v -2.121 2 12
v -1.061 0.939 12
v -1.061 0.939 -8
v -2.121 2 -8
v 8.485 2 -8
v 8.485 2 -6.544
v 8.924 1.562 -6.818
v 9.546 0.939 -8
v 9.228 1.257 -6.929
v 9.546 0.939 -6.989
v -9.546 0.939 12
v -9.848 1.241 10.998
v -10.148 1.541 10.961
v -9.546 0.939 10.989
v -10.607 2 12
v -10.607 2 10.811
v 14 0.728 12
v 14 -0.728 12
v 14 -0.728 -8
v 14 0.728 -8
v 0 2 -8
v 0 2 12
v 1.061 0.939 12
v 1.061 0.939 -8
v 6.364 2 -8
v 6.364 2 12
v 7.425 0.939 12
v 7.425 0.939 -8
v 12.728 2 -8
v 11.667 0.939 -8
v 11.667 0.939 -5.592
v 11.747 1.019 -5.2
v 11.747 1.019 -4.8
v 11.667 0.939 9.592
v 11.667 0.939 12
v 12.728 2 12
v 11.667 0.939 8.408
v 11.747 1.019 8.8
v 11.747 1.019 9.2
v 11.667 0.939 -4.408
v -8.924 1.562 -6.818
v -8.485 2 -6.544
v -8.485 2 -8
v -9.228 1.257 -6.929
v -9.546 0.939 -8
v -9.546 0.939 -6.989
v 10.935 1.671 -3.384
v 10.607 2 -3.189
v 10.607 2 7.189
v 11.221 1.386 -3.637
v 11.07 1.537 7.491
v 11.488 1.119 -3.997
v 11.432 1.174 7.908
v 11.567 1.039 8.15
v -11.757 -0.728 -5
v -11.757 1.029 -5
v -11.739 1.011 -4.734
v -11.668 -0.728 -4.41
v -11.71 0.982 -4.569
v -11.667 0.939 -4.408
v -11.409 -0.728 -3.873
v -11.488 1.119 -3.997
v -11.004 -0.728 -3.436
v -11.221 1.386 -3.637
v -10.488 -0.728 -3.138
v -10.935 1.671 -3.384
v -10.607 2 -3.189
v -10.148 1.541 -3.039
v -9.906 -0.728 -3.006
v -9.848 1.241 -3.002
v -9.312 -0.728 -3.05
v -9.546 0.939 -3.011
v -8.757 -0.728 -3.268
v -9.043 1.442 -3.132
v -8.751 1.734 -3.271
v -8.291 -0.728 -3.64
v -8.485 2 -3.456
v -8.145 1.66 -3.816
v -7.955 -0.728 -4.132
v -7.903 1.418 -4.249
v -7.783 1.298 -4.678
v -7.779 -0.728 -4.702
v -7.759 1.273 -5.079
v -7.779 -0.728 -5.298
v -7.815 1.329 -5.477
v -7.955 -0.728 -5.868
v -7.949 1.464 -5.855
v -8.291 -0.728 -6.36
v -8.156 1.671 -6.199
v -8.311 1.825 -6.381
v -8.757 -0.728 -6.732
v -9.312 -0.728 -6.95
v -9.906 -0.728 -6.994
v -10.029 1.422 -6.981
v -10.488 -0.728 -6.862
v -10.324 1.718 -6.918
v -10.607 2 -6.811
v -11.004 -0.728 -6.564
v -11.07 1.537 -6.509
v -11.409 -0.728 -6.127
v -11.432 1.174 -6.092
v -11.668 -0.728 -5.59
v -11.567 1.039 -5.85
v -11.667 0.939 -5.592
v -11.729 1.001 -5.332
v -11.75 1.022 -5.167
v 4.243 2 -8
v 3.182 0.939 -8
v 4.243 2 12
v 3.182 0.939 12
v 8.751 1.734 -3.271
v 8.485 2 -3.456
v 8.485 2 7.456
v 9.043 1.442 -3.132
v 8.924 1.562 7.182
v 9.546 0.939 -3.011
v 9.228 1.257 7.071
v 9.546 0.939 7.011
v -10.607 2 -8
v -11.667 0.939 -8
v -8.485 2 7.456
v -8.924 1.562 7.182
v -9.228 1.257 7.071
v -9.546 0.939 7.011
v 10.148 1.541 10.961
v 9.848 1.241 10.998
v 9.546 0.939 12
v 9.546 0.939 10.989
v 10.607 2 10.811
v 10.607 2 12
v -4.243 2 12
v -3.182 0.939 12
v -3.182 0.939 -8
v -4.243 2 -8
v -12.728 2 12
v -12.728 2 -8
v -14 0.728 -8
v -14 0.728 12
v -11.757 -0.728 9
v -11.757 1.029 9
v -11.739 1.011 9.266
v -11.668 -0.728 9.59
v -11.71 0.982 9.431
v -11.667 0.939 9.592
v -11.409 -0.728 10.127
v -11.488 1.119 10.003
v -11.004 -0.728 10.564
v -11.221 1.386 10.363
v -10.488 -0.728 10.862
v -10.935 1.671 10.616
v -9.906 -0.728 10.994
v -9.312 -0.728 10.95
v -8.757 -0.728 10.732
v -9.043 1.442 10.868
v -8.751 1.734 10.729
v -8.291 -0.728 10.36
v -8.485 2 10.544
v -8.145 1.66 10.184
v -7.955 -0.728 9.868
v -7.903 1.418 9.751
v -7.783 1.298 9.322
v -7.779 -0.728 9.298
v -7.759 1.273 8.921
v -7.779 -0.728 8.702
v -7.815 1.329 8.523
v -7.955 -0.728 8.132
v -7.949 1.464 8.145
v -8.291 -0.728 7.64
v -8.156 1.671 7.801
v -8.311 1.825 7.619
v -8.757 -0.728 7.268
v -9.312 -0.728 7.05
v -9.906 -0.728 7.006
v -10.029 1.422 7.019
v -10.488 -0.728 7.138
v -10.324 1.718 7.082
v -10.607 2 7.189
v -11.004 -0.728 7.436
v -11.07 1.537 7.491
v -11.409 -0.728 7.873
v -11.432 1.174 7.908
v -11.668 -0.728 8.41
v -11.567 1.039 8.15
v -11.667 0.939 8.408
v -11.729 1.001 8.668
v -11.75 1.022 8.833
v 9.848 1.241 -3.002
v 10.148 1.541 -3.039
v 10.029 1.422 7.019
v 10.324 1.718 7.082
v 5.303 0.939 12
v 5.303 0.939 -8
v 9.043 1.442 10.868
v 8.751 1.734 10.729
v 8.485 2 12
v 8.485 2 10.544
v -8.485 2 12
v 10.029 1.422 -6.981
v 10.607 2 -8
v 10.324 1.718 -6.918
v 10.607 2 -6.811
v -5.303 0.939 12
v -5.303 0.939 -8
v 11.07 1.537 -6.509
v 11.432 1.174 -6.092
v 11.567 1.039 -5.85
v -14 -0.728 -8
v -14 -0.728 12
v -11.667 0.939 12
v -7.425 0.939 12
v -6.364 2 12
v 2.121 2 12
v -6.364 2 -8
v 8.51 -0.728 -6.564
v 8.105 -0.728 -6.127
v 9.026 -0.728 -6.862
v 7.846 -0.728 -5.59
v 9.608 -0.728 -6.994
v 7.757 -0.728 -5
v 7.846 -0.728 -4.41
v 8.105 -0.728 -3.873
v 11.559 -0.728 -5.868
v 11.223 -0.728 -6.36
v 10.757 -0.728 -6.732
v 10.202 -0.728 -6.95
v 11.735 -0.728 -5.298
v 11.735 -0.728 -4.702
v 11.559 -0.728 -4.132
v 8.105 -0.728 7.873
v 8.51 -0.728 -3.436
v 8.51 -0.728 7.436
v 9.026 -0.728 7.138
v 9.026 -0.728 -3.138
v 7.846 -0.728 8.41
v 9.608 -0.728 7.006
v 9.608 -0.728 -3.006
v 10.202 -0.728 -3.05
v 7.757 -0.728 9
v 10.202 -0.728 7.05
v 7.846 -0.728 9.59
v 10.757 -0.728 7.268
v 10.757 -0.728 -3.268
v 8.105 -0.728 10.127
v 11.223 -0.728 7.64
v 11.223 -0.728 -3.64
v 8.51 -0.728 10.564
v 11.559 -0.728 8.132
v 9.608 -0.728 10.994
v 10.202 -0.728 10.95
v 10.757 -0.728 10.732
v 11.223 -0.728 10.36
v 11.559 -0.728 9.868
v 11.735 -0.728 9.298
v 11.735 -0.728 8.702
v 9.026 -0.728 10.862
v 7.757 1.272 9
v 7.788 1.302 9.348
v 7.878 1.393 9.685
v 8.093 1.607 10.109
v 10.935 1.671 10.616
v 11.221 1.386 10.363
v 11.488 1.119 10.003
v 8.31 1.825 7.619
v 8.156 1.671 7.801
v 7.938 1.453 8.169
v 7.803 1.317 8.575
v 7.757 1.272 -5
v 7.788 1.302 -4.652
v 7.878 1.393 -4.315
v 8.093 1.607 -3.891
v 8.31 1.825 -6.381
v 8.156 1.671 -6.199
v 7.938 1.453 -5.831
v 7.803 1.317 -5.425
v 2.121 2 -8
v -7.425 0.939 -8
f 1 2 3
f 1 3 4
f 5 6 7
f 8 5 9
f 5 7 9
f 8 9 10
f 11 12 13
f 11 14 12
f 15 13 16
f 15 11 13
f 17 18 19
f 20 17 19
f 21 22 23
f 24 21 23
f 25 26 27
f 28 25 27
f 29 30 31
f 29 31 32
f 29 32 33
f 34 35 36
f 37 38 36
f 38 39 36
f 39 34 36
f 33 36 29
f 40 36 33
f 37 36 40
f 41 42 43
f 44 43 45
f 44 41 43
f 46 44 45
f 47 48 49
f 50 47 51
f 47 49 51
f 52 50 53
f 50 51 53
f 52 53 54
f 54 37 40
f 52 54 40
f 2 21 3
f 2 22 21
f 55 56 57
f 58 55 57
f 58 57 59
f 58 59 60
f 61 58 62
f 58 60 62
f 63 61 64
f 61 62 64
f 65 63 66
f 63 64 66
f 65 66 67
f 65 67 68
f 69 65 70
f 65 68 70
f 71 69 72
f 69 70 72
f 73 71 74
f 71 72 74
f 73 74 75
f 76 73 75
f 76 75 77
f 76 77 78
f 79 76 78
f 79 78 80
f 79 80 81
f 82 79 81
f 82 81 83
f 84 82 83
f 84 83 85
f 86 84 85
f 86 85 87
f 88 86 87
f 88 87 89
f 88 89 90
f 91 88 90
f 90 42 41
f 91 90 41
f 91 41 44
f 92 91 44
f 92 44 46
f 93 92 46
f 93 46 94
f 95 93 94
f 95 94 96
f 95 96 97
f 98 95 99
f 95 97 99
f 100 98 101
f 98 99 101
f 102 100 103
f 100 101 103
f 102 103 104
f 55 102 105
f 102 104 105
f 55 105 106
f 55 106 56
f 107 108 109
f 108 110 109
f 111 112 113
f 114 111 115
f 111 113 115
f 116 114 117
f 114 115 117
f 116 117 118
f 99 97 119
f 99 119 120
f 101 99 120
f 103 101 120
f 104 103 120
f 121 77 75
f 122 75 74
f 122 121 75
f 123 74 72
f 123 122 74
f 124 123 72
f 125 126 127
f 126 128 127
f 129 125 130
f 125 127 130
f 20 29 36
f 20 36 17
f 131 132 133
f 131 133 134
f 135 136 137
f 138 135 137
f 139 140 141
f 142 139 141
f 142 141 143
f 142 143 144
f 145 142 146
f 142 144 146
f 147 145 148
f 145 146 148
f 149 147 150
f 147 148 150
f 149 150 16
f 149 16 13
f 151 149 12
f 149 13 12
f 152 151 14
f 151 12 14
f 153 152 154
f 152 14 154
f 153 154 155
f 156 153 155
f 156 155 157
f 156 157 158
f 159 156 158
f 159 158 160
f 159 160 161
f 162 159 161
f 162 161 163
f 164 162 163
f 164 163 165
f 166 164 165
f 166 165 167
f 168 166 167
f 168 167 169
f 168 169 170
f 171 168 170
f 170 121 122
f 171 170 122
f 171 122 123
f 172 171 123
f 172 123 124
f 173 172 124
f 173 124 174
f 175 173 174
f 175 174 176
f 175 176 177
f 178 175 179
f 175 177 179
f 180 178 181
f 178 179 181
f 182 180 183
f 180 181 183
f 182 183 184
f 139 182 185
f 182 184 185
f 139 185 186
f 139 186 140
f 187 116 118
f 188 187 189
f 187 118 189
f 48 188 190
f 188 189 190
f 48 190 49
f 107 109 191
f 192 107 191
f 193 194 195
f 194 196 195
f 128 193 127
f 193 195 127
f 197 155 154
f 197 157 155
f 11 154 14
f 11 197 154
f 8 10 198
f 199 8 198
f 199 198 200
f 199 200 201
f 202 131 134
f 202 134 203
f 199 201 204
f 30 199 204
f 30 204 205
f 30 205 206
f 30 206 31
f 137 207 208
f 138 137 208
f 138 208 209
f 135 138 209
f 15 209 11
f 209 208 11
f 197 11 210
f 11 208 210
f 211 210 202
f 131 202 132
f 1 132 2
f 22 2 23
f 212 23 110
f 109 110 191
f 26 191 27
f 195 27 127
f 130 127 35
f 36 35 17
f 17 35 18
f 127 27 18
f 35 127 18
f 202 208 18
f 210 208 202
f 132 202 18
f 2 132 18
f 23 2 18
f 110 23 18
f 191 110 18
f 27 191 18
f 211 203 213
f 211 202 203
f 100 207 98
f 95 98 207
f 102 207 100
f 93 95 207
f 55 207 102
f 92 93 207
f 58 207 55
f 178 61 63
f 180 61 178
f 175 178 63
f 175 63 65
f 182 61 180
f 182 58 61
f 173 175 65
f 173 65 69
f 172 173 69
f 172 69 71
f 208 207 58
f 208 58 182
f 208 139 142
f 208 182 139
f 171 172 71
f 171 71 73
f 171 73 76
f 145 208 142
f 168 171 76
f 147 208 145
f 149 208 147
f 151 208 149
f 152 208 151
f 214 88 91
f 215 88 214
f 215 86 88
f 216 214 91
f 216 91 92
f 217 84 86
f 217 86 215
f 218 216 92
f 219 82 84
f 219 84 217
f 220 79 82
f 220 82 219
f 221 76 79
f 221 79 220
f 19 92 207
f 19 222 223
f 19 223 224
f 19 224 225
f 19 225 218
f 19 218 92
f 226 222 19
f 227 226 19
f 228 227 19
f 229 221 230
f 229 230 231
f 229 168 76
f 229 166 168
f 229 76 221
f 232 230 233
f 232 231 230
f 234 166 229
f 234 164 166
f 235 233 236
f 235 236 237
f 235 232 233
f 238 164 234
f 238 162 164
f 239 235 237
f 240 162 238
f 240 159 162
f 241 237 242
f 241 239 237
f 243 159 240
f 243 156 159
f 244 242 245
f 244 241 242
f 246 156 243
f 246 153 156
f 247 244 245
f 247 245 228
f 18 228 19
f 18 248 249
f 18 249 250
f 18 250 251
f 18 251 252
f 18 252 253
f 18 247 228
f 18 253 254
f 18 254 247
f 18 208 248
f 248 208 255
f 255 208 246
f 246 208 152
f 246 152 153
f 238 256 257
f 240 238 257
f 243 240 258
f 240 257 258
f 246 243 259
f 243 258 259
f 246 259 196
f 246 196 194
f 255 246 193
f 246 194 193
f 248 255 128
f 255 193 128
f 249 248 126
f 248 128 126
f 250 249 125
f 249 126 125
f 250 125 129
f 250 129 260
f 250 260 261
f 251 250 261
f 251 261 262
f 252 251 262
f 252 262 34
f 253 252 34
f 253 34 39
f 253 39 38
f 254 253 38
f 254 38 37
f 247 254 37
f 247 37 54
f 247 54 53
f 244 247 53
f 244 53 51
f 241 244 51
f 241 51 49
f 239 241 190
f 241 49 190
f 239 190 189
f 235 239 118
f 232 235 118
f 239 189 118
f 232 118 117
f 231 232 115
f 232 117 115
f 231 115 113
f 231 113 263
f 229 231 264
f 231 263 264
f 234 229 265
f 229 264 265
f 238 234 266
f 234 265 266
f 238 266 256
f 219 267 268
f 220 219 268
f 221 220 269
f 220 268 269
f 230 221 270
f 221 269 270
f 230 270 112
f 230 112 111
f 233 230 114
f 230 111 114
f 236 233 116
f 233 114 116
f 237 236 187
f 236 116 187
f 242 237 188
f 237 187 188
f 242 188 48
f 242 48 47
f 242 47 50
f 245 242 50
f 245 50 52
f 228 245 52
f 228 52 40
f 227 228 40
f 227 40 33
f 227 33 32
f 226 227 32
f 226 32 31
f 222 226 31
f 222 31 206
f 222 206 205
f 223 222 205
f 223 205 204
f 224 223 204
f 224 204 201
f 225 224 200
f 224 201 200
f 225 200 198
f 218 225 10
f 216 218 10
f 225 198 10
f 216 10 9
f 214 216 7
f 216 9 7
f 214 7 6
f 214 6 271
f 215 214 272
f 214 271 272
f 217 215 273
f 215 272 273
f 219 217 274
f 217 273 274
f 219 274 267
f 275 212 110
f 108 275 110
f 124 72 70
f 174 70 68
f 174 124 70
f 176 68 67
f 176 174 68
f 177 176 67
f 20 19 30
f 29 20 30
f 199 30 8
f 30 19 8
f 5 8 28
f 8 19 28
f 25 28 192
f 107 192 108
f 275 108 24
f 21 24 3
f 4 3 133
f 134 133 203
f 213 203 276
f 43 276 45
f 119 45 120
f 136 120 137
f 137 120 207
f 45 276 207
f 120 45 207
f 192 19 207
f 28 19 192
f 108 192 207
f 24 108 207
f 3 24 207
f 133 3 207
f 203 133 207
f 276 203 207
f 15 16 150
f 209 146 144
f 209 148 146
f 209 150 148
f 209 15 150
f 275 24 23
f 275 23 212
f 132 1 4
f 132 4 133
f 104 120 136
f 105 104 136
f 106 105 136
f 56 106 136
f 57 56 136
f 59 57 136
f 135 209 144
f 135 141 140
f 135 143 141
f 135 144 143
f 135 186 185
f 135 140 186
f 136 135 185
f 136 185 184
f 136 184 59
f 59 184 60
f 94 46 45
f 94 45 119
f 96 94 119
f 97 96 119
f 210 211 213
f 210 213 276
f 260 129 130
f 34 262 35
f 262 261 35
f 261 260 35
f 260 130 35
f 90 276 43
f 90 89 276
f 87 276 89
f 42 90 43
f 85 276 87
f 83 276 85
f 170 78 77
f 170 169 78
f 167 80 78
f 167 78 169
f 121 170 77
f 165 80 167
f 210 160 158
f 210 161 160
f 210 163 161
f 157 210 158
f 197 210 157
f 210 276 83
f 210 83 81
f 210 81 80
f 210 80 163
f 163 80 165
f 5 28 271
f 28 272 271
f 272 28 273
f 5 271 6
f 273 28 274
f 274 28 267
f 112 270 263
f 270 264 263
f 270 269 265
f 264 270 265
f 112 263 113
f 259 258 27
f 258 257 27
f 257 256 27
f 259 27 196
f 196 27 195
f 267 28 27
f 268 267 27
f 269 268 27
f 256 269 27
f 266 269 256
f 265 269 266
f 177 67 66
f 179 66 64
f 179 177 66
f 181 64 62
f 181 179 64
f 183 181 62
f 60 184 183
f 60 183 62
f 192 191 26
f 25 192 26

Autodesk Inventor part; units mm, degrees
ref_plane "YZ Plane" through (0, 0, 0) normal (1, 0, 0) x (0, 1, 0)
ref_plane "XZ Plane" through (0, 0, 0) normal (0, 1, 0) x (-1, 0, 0)
ref_plane "XY Plane" through (0, 0, 0) normal (0, 0, 1) x (1, 0, 0)
sketch "Sketch1" plane through (0, 0, 0) normal (0, 1, 0) x (-1, 0, 0)
  line L0 (14, 12) -> (-14, 12)
  line L1 (-14, 12) -> (-14, -8)
  line L2 (-14, -8) -> (14, -8)
  line L3 (14, -8) -> (14, 12)
  point P0 (0, 0)
  dimension "d0" = 28
  dimension "d1" = 20
  dimension "d4" = 14
extrude "Extrusion1" add sketch "Sketch1" along normal mid plane 4
sketch "Sketch2" plane through (-14, 2, 12) normal (0, 0, 1) x (1, 0, 0)
  line L0 (0, 0) -> (28, 0) projected
  line L1 (14, 0) -> (12.9393, -1.0607)
  line L2 (14, 0) -> (15.5, 0) construction
  line L3 (12.9393, -1.0607) -> (11.8787, 0)
  line L4 (11.8787, 0) -> (10.818, -1.0607)
  line L5 (10.818, -1.0607) -> (9.7574, 0)
  line L6 (9.7574, 0) -> (8.6967, -1.0607)
  line L7 (8.6967, -1.0607) -> (7.636, 0)
  line L8 (7.636, 0) -> (6.5754, -1.0607)
  line L9 (6.5754, -1.0607) -> (5.5147, 0)
  line L10 (5.5147, 0) -> (4.4541, -1.0607)
  line L11 (4.4541, -1.0607) -> (3.3934, 0)
  line L12 (3.3934, 0) -> (2.3327, -1.0607)
  line L13 (2.3327, -1.0607) -> (1.2721, 0)
  line L14 (1.2721, 0) -> (0, -1.2721)
  line L15 (0, 0) -> (0, -4) projected
  line L16 (14, 0) -> (15.0607, -1.0607)
  line L17 (15.0607, -1.0607) -> (16.1213, 0)
  line L18 (16.1213, 0) -> (17.182, -1.0607)
  line L19 (17.182, -1.0607) -> (18.2426, 0)
  line L20 (18.2426, 0) -> (19.3033, -1.0607)
  line L21 (19.3033, -1.0607) -> (20.364, 0)
  line L22 (20.364, 0) -> (21.4246, -1.0607)
  line L23 (21.4246, -1.0607) -> (22.4853, 0)
  line L24 (22.4853, 0) -> (23.5459, -1.0607)
  line L25 (23.5459, -1.0607) -> (24.6066, 0)
  line L26 (24.6066, 0) -> (25.6673, -1.0607)
  line L27 (25.6673, -1.0607) -> (26.7279, 0)
  line L28 (26.7279, 0) -> (28, -1.2721)
  line L29 (28, -4) -> (28, 0) projected
  point P0 (14, -2)
  point P1 (1.2721, 0)
  point P2 (1.2721, 0)
  point P3 (5.5147, 0)
  point P4 (5.5147, 0)
  point P5 (7.636, 0)
  point P6 (7.636, 0)
  point P7 (9.7574, 0)
  point P8 (9.7574, 0)
  dimension "d5" = 1.5
  dimension "d6" = 135
  dimension "d7" = 1.5
extrude "Extrusion2" cut sketch "Sketch2" against normal blind 50
mirror "Mirror1" about plane through (0, 0, 0) normal (0, 1, 0) of "Extrusion2"
sketch "Sketch4" plane through (14, -0.7279, 12) normal (0, 0, 1) x (1, 0, 0)
  line L0 (-26.7279, -1.2721) -> (-28, 0) projected
  line L1 (-28, 0) -> (1.5875, 0)
  line L2 (1.5875, 0) -> (1.5875, -7.9375)
  line L3 (1.5875, -7.9375) -> (-28, -7.9375)
  line L4 (-28, -7.9375) -> (-28, 0)
  point P0 (-14, 0.7279)
extrude "Extrusion4" cut sketch "Sketch4" against normal blind 50
sketch "Sketch5" plane through (0, 0, 0) normal (0, 1, 0) x (-1, 0, 0)
  circle A0 centre (9.757, 9) radius 2
  circle A1 centre (-9.757, 9) radius 2
  circle A2 centre (9.757, -5) radius 2
  circle A3 centre (-9.757, -5) radius 2
  point P0 (0, 0)
  dimension "d16" = 4
  dimension "d17" = 4
  dimension "d18" = 4
  dimension "d19" = 4
extrude "Extrusion5" cut sketch "Sketch5" against normal mid plane 10
properties part number "g2Tensioner2"
